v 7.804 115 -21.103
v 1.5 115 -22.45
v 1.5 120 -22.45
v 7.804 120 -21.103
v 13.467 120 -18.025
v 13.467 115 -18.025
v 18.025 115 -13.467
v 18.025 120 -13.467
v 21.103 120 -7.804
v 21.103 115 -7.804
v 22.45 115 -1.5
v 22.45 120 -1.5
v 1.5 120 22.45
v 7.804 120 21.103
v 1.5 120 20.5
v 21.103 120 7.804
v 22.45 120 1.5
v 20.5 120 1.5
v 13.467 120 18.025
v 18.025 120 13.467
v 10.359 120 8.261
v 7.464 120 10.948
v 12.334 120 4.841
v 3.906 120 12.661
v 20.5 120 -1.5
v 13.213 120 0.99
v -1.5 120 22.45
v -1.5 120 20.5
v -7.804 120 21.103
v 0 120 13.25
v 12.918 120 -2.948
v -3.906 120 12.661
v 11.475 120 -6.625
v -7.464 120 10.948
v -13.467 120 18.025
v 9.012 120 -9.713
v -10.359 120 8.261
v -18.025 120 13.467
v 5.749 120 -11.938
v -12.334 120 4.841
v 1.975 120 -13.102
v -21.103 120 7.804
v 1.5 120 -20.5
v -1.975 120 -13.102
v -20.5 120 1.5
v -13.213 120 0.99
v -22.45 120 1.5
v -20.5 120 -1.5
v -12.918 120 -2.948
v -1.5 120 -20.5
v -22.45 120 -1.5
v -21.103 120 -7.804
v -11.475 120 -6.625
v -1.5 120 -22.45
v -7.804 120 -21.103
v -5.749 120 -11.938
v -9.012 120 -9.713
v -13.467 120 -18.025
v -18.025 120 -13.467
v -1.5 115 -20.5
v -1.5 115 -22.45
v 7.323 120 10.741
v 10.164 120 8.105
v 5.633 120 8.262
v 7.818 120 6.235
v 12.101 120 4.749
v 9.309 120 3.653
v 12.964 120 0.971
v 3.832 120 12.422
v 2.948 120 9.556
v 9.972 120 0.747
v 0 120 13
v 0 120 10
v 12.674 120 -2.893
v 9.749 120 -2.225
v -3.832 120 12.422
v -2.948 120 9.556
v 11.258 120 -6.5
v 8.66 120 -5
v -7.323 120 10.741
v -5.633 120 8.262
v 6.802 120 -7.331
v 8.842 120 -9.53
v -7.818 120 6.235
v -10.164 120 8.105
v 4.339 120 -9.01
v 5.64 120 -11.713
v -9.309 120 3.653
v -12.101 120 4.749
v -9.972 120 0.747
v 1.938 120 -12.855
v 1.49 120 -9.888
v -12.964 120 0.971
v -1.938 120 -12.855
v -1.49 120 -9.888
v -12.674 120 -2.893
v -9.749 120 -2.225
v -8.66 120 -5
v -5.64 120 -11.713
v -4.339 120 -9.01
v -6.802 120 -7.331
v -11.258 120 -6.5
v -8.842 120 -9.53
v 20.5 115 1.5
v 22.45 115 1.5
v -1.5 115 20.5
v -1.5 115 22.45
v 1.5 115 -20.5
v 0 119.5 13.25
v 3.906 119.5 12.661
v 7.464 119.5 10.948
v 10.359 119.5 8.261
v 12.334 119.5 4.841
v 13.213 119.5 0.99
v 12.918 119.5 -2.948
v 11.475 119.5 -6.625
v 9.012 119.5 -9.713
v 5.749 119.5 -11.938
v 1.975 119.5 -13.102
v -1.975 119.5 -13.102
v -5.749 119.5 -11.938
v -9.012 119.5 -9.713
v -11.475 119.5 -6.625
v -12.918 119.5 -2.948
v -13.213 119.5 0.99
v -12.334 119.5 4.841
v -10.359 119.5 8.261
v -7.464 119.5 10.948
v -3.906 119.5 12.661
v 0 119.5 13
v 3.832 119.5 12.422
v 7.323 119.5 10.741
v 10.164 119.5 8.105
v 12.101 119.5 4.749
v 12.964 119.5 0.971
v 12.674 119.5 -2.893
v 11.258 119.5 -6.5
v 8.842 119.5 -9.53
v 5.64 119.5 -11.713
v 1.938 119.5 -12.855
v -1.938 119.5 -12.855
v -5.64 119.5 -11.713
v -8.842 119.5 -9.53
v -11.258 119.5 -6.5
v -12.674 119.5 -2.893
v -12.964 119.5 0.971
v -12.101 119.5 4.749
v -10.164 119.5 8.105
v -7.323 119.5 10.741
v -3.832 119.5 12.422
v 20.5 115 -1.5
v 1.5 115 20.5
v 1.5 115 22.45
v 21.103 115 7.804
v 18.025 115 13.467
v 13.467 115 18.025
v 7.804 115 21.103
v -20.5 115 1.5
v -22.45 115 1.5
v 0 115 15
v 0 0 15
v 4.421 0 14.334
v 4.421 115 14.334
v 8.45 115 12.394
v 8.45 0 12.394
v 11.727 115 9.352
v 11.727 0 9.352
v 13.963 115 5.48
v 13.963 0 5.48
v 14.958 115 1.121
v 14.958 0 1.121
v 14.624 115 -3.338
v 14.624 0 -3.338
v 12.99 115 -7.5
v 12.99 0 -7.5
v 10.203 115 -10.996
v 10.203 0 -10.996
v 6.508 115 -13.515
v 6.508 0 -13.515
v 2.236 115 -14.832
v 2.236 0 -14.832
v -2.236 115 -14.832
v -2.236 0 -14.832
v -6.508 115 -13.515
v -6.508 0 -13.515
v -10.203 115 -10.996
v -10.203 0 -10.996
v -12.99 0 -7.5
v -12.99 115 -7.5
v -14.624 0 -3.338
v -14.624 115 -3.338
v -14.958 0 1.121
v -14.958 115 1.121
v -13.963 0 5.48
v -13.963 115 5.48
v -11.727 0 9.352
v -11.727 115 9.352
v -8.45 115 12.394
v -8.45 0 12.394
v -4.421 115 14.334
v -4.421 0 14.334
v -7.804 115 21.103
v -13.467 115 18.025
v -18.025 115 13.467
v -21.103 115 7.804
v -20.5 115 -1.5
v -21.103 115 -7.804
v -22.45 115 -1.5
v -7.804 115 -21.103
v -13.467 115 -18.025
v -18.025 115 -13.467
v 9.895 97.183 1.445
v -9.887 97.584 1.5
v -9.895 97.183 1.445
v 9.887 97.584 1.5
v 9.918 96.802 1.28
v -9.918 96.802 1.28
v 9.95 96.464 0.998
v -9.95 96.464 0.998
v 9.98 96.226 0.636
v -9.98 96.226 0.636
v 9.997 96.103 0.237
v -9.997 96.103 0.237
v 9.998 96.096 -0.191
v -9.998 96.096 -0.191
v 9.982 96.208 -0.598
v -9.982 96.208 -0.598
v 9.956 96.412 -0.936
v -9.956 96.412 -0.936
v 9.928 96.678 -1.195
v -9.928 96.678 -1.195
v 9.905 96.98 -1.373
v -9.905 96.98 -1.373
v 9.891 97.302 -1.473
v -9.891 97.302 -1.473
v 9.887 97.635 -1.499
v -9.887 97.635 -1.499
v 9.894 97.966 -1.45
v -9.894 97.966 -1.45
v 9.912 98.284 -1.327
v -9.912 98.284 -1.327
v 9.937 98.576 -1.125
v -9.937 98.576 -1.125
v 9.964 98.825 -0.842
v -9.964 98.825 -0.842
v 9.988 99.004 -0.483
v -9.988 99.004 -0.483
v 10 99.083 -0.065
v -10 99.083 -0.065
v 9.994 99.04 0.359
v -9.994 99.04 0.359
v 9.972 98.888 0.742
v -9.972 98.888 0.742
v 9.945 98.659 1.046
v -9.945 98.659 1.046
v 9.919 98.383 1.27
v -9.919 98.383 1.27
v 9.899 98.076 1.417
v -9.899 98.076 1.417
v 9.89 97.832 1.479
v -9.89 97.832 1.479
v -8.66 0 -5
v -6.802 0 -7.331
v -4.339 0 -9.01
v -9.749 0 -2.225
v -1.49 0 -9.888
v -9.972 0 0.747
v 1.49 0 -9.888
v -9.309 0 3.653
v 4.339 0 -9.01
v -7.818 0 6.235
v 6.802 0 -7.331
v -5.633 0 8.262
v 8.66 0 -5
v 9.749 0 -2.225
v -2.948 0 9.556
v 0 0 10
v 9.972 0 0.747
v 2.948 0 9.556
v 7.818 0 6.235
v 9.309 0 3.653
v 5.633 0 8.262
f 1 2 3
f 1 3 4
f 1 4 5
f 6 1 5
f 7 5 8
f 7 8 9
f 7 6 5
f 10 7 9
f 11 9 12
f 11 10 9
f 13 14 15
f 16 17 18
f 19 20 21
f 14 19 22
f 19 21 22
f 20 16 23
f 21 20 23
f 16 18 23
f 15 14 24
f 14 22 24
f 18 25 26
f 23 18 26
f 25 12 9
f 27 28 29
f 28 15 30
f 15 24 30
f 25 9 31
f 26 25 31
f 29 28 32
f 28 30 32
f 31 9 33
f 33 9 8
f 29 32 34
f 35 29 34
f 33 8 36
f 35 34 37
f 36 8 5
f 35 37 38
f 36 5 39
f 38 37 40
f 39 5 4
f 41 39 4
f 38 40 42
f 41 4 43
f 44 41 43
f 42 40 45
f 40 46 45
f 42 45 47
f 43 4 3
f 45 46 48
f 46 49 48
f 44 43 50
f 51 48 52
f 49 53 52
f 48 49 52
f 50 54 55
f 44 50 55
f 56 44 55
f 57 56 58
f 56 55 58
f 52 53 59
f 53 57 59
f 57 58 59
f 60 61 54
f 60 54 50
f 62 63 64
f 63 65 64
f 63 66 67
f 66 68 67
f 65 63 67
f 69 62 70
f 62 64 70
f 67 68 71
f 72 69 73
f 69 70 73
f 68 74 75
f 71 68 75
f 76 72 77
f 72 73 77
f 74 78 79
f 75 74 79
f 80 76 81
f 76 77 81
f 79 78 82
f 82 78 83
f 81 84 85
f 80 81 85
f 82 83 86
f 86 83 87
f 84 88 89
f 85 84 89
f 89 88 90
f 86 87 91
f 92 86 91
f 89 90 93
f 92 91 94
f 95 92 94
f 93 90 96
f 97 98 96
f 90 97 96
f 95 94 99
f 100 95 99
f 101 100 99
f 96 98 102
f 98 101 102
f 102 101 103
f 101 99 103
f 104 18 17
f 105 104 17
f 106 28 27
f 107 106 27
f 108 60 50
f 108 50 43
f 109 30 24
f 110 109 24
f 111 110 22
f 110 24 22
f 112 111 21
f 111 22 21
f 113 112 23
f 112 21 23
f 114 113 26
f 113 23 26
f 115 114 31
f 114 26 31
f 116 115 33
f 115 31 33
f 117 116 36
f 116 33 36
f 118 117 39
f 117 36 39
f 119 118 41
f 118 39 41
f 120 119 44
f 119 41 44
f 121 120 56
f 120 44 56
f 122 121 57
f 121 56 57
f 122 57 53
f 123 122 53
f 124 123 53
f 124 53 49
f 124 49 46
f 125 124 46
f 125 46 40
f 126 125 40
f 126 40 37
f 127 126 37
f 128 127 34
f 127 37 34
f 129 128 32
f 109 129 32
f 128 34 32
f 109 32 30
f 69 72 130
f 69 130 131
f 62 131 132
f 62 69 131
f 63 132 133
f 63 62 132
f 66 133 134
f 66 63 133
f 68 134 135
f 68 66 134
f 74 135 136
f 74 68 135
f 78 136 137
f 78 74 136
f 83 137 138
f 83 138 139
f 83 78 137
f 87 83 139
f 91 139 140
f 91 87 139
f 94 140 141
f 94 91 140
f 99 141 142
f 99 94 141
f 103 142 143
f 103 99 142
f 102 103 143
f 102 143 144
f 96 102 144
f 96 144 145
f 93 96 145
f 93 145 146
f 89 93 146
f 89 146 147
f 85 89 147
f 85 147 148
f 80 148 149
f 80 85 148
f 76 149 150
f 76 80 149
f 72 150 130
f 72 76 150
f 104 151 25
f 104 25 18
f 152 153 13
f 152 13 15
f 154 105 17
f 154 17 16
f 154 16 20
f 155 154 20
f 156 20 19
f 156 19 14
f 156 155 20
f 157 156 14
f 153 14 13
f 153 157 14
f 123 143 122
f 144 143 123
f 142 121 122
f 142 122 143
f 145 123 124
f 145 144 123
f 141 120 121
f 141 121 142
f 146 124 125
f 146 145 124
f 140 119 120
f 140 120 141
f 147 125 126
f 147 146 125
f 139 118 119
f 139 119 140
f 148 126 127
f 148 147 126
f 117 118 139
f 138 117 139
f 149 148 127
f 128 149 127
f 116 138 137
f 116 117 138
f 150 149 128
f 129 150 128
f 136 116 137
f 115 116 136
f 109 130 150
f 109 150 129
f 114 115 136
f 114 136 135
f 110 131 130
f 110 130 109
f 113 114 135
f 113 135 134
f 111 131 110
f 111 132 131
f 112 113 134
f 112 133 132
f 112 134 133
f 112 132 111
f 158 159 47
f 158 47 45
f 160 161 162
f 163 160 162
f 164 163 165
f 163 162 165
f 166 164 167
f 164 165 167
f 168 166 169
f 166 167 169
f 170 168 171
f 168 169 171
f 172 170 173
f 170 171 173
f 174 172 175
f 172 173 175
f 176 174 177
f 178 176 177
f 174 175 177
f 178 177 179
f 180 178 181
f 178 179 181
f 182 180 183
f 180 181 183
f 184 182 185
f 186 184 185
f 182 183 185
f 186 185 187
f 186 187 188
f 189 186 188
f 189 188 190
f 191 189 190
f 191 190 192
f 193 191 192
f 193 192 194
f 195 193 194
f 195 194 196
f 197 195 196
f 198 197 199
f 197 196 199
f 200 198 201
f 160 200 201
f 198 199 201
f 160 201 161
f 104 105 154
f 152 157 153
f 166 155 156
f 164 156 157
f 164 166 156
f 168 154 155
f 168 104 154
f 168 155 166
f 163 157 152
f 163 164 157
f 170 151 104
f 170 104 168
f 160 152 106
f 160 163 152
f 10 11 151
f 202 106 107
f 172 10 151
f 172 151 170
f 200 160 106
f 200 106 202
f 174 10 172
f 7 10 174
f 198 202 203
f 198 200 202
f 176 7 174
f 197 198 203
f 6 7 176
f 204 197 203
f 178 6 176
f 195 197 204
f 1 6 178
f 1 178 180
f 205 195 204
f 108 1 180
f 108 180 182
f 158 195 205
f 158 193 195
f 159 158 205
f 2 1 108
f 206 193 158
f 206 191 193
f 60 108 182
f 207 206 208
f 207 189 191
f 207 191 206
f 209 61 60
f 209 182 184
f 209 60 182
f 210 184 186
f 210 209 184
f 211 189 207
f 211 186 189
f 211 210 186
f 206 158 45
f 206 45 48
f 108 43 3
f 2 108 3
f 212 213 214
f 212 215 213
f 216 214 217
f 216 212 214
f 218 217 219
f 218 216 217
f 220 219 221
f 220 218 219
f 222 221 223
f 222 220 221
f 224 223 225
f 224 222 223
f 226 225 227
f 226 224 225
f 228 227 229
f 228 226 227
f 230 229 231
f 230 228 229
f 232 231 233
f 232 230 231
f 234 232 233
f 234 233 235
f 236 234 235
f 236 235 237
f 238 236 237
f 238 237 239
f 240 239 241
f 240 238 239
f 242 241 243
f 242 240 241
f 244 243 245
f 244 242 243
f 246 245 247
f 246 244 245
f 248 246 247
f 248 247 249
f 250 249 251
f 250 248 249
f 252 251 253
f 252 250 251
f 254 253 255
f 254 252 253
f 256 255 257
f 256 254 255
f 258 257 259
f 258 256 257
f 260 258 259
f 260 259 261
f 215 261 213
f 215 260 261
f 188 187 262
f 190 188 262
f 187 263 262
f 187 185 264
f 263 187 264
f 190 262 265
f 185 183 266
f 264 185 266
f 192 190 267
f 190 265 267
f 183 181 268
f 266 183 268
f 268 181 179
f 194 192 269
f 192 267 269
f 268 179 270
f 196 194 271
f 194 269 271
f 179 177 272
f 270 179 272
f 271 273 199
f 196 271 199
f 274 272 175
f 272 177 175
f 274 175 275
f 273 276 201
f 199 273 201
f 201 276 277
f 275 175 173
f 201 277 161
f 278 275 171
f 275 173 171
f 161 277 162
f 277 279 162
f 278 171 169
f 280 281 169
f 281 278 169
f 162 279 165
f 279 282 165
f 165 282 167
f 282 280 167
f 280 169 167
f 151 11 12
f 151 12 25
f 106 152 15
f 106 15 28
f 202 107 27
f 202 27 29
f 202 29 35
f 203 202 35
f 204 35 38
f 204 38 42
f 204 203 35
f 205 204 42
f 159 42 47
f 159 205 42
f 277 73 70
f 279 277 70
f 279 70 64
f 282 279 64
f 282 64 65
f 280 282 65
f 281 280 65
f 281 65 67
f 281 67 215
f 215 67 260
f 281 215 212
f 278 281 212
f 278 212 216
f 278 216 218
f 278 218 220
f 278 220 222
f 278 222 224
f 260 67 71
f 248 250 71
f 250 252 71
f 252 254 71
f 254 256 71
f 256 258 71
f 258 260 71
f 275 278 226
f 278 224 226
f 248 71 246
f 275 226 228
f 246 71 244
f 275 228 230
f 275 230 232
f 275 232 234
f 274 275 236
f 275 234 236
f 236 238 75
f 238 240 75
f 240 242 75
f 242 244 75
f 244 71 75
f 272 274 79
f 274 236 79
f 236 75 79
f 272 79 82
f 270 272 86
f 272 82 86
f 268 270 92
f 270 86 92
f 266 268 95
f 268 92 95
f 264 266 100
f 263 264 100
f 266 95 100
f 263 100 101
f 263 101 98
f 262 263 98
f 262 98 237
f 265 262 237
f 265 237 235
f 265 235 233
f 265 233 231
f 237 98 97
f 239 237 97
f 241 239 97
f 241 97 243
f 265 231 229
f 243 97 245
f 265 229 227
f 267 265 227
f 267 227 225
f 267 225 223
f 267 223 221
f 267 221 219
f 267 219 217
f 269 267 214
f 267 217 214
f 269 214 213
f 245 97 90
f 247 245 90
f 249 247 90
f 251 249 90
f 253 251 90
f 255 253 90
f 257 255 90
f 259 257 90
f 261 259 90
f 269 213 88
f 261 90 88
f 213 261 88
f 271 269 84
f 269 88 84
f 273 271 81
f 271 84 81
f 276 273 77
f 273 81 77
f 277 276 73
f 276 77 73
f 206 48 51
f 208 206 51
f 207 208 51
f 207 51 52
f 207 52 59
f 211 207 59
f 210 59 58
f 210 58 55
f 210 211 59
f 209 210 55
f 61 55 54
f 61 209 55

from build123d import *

# Parameters (mm, degrees)
SKETCH1_R           = 15
BOSS_EXTRUDE1_DEPTH = 115
BOSS_EXTRUDE2_DEPTH = 5
SKETCH3_R           = 13.25
SKETCH3_R_2         = 13
CUT_EXTRUDE1_DEPTH  = 0.5
SKETCH4_R           = 10
CUT_EXTRUDE2_DEPTH  = 125.128965193
SKETCH5_R           = 1.5
BOSS_EXTRUDE3_DEPTH = 10.35


with BuildPart() as part:
    # Sketch1 → Boss-Extrude1 (new body)
    with BuildSketch(Plane(origin=(0, 0, 0), x_dir=(1, 0, 0), z_dir=(0, 1, 0))):
        with Locations(Location((0, 0, 0), (0, 0, 270))):
            Circle(SKETCH1_R)
    extrude(amount=BOSS_EXTRUDE1_DEPTH)

    # Sketch2 → Boss-Extrude2 (add)
    with BuildSketch(Plane(origin=(0, 115, 0), x_dir=(1, 0, 0), z_dir=(0, 1, 0))):
        with BuildLine():
            Line((-1.5, 20.5), (1.5, 20.5))
            Line((1.5, 20.5), (1.5, 22.449944321))
            ThreePointArc((1.5, 22.449944321), (15.909902577, 15.909902577), (22.449944321, 1.5))
            Line((22.449944321, 1.5), (20.5, 1.5))
            Line((20.5, 1.5), (20.5, -1.5))
            Line((20.5, -1.5), (22.449944321, -1.5))
            ThreePointArc((22.449944321, -1.5), (15.909902577, -15.909902577), (1.5, -22.449944321))
            Line((1.5, -22.449944321), (1.5, -20.5))
            Line((1.5, -20.5), (-1.5, -20.5))
            Line((-1.5, -20.5), (-1.5, -22.449944321))
            ThreePointArc((-1.5, -22.449944321), (-15.909902577, -15.909902577), (-22.449944321, -1.5))
            Line((-22.449944321, -1.5), (-20.5, -1.5))
            Line((-20.5, -1.5), (-20.5, 1.5))
            Line((-20.5, 1.5), (-22.449944321, 1.5))
            ThreePointArc((-22.449944321, 1.5), (-15.909902577, 15.909902577), (-1.5, 22.449944321))
            Line((-1.5, 22.449944321), (-1.5, 20.5))
        make_face()
    extrude(amount=BOSS_EXTRUDE2_DEPTH)

    # Sketch3 → Cut-Extrude1 (cut)
    with BuildSketch(Plane(origin=(0, 120, 0), x_dir=(1, 0, 0), z_dir=(0, 1, 0))):
        with Locations(Location((0, 0, 0), (0, 0, 270))):
            Circle(SKETCH3_R)
        with Locations(Location((0, 0, 0), (0, 0, 270))):
            Circle(SKETCH3_R_2, mode=Mode.SUBTRACT)
    extrude(amount=-CUT_EXTRUDE1_DEPTH, mode=Mode.SUBTRACT)

    # Sketch4 → Cut-Extrude2 (cut, through all)
    with BuildSketch(Plane(origin=(0, 120, 0), x_dir=(1, 0, 0), z_dir=(0, 1, 0))):
        with Locations(Location((0, 0, 0), (0, 0, 270))):
            Circle(SKETCH4_R)
    extrude(amount=-CUT_EXTRUDE2_DEPTH, mode=Mode.SUBTRACT)

    # Sketch5 → Boss-Extrude3 (add, symmetric)
    with BuildSketch(Plane(origin=(0, 0, 0), x_dir=(0, 0, -1), z_dir=(1, 0, 0))):
        with Locations(Location((0, 97.584149944, 0), (0, 0, 180))):
            Circle(SKETCH5_R)
    extrude(amount=BOSS_EXTRUDE3_DEPTH, both=True)


solid = part.part
